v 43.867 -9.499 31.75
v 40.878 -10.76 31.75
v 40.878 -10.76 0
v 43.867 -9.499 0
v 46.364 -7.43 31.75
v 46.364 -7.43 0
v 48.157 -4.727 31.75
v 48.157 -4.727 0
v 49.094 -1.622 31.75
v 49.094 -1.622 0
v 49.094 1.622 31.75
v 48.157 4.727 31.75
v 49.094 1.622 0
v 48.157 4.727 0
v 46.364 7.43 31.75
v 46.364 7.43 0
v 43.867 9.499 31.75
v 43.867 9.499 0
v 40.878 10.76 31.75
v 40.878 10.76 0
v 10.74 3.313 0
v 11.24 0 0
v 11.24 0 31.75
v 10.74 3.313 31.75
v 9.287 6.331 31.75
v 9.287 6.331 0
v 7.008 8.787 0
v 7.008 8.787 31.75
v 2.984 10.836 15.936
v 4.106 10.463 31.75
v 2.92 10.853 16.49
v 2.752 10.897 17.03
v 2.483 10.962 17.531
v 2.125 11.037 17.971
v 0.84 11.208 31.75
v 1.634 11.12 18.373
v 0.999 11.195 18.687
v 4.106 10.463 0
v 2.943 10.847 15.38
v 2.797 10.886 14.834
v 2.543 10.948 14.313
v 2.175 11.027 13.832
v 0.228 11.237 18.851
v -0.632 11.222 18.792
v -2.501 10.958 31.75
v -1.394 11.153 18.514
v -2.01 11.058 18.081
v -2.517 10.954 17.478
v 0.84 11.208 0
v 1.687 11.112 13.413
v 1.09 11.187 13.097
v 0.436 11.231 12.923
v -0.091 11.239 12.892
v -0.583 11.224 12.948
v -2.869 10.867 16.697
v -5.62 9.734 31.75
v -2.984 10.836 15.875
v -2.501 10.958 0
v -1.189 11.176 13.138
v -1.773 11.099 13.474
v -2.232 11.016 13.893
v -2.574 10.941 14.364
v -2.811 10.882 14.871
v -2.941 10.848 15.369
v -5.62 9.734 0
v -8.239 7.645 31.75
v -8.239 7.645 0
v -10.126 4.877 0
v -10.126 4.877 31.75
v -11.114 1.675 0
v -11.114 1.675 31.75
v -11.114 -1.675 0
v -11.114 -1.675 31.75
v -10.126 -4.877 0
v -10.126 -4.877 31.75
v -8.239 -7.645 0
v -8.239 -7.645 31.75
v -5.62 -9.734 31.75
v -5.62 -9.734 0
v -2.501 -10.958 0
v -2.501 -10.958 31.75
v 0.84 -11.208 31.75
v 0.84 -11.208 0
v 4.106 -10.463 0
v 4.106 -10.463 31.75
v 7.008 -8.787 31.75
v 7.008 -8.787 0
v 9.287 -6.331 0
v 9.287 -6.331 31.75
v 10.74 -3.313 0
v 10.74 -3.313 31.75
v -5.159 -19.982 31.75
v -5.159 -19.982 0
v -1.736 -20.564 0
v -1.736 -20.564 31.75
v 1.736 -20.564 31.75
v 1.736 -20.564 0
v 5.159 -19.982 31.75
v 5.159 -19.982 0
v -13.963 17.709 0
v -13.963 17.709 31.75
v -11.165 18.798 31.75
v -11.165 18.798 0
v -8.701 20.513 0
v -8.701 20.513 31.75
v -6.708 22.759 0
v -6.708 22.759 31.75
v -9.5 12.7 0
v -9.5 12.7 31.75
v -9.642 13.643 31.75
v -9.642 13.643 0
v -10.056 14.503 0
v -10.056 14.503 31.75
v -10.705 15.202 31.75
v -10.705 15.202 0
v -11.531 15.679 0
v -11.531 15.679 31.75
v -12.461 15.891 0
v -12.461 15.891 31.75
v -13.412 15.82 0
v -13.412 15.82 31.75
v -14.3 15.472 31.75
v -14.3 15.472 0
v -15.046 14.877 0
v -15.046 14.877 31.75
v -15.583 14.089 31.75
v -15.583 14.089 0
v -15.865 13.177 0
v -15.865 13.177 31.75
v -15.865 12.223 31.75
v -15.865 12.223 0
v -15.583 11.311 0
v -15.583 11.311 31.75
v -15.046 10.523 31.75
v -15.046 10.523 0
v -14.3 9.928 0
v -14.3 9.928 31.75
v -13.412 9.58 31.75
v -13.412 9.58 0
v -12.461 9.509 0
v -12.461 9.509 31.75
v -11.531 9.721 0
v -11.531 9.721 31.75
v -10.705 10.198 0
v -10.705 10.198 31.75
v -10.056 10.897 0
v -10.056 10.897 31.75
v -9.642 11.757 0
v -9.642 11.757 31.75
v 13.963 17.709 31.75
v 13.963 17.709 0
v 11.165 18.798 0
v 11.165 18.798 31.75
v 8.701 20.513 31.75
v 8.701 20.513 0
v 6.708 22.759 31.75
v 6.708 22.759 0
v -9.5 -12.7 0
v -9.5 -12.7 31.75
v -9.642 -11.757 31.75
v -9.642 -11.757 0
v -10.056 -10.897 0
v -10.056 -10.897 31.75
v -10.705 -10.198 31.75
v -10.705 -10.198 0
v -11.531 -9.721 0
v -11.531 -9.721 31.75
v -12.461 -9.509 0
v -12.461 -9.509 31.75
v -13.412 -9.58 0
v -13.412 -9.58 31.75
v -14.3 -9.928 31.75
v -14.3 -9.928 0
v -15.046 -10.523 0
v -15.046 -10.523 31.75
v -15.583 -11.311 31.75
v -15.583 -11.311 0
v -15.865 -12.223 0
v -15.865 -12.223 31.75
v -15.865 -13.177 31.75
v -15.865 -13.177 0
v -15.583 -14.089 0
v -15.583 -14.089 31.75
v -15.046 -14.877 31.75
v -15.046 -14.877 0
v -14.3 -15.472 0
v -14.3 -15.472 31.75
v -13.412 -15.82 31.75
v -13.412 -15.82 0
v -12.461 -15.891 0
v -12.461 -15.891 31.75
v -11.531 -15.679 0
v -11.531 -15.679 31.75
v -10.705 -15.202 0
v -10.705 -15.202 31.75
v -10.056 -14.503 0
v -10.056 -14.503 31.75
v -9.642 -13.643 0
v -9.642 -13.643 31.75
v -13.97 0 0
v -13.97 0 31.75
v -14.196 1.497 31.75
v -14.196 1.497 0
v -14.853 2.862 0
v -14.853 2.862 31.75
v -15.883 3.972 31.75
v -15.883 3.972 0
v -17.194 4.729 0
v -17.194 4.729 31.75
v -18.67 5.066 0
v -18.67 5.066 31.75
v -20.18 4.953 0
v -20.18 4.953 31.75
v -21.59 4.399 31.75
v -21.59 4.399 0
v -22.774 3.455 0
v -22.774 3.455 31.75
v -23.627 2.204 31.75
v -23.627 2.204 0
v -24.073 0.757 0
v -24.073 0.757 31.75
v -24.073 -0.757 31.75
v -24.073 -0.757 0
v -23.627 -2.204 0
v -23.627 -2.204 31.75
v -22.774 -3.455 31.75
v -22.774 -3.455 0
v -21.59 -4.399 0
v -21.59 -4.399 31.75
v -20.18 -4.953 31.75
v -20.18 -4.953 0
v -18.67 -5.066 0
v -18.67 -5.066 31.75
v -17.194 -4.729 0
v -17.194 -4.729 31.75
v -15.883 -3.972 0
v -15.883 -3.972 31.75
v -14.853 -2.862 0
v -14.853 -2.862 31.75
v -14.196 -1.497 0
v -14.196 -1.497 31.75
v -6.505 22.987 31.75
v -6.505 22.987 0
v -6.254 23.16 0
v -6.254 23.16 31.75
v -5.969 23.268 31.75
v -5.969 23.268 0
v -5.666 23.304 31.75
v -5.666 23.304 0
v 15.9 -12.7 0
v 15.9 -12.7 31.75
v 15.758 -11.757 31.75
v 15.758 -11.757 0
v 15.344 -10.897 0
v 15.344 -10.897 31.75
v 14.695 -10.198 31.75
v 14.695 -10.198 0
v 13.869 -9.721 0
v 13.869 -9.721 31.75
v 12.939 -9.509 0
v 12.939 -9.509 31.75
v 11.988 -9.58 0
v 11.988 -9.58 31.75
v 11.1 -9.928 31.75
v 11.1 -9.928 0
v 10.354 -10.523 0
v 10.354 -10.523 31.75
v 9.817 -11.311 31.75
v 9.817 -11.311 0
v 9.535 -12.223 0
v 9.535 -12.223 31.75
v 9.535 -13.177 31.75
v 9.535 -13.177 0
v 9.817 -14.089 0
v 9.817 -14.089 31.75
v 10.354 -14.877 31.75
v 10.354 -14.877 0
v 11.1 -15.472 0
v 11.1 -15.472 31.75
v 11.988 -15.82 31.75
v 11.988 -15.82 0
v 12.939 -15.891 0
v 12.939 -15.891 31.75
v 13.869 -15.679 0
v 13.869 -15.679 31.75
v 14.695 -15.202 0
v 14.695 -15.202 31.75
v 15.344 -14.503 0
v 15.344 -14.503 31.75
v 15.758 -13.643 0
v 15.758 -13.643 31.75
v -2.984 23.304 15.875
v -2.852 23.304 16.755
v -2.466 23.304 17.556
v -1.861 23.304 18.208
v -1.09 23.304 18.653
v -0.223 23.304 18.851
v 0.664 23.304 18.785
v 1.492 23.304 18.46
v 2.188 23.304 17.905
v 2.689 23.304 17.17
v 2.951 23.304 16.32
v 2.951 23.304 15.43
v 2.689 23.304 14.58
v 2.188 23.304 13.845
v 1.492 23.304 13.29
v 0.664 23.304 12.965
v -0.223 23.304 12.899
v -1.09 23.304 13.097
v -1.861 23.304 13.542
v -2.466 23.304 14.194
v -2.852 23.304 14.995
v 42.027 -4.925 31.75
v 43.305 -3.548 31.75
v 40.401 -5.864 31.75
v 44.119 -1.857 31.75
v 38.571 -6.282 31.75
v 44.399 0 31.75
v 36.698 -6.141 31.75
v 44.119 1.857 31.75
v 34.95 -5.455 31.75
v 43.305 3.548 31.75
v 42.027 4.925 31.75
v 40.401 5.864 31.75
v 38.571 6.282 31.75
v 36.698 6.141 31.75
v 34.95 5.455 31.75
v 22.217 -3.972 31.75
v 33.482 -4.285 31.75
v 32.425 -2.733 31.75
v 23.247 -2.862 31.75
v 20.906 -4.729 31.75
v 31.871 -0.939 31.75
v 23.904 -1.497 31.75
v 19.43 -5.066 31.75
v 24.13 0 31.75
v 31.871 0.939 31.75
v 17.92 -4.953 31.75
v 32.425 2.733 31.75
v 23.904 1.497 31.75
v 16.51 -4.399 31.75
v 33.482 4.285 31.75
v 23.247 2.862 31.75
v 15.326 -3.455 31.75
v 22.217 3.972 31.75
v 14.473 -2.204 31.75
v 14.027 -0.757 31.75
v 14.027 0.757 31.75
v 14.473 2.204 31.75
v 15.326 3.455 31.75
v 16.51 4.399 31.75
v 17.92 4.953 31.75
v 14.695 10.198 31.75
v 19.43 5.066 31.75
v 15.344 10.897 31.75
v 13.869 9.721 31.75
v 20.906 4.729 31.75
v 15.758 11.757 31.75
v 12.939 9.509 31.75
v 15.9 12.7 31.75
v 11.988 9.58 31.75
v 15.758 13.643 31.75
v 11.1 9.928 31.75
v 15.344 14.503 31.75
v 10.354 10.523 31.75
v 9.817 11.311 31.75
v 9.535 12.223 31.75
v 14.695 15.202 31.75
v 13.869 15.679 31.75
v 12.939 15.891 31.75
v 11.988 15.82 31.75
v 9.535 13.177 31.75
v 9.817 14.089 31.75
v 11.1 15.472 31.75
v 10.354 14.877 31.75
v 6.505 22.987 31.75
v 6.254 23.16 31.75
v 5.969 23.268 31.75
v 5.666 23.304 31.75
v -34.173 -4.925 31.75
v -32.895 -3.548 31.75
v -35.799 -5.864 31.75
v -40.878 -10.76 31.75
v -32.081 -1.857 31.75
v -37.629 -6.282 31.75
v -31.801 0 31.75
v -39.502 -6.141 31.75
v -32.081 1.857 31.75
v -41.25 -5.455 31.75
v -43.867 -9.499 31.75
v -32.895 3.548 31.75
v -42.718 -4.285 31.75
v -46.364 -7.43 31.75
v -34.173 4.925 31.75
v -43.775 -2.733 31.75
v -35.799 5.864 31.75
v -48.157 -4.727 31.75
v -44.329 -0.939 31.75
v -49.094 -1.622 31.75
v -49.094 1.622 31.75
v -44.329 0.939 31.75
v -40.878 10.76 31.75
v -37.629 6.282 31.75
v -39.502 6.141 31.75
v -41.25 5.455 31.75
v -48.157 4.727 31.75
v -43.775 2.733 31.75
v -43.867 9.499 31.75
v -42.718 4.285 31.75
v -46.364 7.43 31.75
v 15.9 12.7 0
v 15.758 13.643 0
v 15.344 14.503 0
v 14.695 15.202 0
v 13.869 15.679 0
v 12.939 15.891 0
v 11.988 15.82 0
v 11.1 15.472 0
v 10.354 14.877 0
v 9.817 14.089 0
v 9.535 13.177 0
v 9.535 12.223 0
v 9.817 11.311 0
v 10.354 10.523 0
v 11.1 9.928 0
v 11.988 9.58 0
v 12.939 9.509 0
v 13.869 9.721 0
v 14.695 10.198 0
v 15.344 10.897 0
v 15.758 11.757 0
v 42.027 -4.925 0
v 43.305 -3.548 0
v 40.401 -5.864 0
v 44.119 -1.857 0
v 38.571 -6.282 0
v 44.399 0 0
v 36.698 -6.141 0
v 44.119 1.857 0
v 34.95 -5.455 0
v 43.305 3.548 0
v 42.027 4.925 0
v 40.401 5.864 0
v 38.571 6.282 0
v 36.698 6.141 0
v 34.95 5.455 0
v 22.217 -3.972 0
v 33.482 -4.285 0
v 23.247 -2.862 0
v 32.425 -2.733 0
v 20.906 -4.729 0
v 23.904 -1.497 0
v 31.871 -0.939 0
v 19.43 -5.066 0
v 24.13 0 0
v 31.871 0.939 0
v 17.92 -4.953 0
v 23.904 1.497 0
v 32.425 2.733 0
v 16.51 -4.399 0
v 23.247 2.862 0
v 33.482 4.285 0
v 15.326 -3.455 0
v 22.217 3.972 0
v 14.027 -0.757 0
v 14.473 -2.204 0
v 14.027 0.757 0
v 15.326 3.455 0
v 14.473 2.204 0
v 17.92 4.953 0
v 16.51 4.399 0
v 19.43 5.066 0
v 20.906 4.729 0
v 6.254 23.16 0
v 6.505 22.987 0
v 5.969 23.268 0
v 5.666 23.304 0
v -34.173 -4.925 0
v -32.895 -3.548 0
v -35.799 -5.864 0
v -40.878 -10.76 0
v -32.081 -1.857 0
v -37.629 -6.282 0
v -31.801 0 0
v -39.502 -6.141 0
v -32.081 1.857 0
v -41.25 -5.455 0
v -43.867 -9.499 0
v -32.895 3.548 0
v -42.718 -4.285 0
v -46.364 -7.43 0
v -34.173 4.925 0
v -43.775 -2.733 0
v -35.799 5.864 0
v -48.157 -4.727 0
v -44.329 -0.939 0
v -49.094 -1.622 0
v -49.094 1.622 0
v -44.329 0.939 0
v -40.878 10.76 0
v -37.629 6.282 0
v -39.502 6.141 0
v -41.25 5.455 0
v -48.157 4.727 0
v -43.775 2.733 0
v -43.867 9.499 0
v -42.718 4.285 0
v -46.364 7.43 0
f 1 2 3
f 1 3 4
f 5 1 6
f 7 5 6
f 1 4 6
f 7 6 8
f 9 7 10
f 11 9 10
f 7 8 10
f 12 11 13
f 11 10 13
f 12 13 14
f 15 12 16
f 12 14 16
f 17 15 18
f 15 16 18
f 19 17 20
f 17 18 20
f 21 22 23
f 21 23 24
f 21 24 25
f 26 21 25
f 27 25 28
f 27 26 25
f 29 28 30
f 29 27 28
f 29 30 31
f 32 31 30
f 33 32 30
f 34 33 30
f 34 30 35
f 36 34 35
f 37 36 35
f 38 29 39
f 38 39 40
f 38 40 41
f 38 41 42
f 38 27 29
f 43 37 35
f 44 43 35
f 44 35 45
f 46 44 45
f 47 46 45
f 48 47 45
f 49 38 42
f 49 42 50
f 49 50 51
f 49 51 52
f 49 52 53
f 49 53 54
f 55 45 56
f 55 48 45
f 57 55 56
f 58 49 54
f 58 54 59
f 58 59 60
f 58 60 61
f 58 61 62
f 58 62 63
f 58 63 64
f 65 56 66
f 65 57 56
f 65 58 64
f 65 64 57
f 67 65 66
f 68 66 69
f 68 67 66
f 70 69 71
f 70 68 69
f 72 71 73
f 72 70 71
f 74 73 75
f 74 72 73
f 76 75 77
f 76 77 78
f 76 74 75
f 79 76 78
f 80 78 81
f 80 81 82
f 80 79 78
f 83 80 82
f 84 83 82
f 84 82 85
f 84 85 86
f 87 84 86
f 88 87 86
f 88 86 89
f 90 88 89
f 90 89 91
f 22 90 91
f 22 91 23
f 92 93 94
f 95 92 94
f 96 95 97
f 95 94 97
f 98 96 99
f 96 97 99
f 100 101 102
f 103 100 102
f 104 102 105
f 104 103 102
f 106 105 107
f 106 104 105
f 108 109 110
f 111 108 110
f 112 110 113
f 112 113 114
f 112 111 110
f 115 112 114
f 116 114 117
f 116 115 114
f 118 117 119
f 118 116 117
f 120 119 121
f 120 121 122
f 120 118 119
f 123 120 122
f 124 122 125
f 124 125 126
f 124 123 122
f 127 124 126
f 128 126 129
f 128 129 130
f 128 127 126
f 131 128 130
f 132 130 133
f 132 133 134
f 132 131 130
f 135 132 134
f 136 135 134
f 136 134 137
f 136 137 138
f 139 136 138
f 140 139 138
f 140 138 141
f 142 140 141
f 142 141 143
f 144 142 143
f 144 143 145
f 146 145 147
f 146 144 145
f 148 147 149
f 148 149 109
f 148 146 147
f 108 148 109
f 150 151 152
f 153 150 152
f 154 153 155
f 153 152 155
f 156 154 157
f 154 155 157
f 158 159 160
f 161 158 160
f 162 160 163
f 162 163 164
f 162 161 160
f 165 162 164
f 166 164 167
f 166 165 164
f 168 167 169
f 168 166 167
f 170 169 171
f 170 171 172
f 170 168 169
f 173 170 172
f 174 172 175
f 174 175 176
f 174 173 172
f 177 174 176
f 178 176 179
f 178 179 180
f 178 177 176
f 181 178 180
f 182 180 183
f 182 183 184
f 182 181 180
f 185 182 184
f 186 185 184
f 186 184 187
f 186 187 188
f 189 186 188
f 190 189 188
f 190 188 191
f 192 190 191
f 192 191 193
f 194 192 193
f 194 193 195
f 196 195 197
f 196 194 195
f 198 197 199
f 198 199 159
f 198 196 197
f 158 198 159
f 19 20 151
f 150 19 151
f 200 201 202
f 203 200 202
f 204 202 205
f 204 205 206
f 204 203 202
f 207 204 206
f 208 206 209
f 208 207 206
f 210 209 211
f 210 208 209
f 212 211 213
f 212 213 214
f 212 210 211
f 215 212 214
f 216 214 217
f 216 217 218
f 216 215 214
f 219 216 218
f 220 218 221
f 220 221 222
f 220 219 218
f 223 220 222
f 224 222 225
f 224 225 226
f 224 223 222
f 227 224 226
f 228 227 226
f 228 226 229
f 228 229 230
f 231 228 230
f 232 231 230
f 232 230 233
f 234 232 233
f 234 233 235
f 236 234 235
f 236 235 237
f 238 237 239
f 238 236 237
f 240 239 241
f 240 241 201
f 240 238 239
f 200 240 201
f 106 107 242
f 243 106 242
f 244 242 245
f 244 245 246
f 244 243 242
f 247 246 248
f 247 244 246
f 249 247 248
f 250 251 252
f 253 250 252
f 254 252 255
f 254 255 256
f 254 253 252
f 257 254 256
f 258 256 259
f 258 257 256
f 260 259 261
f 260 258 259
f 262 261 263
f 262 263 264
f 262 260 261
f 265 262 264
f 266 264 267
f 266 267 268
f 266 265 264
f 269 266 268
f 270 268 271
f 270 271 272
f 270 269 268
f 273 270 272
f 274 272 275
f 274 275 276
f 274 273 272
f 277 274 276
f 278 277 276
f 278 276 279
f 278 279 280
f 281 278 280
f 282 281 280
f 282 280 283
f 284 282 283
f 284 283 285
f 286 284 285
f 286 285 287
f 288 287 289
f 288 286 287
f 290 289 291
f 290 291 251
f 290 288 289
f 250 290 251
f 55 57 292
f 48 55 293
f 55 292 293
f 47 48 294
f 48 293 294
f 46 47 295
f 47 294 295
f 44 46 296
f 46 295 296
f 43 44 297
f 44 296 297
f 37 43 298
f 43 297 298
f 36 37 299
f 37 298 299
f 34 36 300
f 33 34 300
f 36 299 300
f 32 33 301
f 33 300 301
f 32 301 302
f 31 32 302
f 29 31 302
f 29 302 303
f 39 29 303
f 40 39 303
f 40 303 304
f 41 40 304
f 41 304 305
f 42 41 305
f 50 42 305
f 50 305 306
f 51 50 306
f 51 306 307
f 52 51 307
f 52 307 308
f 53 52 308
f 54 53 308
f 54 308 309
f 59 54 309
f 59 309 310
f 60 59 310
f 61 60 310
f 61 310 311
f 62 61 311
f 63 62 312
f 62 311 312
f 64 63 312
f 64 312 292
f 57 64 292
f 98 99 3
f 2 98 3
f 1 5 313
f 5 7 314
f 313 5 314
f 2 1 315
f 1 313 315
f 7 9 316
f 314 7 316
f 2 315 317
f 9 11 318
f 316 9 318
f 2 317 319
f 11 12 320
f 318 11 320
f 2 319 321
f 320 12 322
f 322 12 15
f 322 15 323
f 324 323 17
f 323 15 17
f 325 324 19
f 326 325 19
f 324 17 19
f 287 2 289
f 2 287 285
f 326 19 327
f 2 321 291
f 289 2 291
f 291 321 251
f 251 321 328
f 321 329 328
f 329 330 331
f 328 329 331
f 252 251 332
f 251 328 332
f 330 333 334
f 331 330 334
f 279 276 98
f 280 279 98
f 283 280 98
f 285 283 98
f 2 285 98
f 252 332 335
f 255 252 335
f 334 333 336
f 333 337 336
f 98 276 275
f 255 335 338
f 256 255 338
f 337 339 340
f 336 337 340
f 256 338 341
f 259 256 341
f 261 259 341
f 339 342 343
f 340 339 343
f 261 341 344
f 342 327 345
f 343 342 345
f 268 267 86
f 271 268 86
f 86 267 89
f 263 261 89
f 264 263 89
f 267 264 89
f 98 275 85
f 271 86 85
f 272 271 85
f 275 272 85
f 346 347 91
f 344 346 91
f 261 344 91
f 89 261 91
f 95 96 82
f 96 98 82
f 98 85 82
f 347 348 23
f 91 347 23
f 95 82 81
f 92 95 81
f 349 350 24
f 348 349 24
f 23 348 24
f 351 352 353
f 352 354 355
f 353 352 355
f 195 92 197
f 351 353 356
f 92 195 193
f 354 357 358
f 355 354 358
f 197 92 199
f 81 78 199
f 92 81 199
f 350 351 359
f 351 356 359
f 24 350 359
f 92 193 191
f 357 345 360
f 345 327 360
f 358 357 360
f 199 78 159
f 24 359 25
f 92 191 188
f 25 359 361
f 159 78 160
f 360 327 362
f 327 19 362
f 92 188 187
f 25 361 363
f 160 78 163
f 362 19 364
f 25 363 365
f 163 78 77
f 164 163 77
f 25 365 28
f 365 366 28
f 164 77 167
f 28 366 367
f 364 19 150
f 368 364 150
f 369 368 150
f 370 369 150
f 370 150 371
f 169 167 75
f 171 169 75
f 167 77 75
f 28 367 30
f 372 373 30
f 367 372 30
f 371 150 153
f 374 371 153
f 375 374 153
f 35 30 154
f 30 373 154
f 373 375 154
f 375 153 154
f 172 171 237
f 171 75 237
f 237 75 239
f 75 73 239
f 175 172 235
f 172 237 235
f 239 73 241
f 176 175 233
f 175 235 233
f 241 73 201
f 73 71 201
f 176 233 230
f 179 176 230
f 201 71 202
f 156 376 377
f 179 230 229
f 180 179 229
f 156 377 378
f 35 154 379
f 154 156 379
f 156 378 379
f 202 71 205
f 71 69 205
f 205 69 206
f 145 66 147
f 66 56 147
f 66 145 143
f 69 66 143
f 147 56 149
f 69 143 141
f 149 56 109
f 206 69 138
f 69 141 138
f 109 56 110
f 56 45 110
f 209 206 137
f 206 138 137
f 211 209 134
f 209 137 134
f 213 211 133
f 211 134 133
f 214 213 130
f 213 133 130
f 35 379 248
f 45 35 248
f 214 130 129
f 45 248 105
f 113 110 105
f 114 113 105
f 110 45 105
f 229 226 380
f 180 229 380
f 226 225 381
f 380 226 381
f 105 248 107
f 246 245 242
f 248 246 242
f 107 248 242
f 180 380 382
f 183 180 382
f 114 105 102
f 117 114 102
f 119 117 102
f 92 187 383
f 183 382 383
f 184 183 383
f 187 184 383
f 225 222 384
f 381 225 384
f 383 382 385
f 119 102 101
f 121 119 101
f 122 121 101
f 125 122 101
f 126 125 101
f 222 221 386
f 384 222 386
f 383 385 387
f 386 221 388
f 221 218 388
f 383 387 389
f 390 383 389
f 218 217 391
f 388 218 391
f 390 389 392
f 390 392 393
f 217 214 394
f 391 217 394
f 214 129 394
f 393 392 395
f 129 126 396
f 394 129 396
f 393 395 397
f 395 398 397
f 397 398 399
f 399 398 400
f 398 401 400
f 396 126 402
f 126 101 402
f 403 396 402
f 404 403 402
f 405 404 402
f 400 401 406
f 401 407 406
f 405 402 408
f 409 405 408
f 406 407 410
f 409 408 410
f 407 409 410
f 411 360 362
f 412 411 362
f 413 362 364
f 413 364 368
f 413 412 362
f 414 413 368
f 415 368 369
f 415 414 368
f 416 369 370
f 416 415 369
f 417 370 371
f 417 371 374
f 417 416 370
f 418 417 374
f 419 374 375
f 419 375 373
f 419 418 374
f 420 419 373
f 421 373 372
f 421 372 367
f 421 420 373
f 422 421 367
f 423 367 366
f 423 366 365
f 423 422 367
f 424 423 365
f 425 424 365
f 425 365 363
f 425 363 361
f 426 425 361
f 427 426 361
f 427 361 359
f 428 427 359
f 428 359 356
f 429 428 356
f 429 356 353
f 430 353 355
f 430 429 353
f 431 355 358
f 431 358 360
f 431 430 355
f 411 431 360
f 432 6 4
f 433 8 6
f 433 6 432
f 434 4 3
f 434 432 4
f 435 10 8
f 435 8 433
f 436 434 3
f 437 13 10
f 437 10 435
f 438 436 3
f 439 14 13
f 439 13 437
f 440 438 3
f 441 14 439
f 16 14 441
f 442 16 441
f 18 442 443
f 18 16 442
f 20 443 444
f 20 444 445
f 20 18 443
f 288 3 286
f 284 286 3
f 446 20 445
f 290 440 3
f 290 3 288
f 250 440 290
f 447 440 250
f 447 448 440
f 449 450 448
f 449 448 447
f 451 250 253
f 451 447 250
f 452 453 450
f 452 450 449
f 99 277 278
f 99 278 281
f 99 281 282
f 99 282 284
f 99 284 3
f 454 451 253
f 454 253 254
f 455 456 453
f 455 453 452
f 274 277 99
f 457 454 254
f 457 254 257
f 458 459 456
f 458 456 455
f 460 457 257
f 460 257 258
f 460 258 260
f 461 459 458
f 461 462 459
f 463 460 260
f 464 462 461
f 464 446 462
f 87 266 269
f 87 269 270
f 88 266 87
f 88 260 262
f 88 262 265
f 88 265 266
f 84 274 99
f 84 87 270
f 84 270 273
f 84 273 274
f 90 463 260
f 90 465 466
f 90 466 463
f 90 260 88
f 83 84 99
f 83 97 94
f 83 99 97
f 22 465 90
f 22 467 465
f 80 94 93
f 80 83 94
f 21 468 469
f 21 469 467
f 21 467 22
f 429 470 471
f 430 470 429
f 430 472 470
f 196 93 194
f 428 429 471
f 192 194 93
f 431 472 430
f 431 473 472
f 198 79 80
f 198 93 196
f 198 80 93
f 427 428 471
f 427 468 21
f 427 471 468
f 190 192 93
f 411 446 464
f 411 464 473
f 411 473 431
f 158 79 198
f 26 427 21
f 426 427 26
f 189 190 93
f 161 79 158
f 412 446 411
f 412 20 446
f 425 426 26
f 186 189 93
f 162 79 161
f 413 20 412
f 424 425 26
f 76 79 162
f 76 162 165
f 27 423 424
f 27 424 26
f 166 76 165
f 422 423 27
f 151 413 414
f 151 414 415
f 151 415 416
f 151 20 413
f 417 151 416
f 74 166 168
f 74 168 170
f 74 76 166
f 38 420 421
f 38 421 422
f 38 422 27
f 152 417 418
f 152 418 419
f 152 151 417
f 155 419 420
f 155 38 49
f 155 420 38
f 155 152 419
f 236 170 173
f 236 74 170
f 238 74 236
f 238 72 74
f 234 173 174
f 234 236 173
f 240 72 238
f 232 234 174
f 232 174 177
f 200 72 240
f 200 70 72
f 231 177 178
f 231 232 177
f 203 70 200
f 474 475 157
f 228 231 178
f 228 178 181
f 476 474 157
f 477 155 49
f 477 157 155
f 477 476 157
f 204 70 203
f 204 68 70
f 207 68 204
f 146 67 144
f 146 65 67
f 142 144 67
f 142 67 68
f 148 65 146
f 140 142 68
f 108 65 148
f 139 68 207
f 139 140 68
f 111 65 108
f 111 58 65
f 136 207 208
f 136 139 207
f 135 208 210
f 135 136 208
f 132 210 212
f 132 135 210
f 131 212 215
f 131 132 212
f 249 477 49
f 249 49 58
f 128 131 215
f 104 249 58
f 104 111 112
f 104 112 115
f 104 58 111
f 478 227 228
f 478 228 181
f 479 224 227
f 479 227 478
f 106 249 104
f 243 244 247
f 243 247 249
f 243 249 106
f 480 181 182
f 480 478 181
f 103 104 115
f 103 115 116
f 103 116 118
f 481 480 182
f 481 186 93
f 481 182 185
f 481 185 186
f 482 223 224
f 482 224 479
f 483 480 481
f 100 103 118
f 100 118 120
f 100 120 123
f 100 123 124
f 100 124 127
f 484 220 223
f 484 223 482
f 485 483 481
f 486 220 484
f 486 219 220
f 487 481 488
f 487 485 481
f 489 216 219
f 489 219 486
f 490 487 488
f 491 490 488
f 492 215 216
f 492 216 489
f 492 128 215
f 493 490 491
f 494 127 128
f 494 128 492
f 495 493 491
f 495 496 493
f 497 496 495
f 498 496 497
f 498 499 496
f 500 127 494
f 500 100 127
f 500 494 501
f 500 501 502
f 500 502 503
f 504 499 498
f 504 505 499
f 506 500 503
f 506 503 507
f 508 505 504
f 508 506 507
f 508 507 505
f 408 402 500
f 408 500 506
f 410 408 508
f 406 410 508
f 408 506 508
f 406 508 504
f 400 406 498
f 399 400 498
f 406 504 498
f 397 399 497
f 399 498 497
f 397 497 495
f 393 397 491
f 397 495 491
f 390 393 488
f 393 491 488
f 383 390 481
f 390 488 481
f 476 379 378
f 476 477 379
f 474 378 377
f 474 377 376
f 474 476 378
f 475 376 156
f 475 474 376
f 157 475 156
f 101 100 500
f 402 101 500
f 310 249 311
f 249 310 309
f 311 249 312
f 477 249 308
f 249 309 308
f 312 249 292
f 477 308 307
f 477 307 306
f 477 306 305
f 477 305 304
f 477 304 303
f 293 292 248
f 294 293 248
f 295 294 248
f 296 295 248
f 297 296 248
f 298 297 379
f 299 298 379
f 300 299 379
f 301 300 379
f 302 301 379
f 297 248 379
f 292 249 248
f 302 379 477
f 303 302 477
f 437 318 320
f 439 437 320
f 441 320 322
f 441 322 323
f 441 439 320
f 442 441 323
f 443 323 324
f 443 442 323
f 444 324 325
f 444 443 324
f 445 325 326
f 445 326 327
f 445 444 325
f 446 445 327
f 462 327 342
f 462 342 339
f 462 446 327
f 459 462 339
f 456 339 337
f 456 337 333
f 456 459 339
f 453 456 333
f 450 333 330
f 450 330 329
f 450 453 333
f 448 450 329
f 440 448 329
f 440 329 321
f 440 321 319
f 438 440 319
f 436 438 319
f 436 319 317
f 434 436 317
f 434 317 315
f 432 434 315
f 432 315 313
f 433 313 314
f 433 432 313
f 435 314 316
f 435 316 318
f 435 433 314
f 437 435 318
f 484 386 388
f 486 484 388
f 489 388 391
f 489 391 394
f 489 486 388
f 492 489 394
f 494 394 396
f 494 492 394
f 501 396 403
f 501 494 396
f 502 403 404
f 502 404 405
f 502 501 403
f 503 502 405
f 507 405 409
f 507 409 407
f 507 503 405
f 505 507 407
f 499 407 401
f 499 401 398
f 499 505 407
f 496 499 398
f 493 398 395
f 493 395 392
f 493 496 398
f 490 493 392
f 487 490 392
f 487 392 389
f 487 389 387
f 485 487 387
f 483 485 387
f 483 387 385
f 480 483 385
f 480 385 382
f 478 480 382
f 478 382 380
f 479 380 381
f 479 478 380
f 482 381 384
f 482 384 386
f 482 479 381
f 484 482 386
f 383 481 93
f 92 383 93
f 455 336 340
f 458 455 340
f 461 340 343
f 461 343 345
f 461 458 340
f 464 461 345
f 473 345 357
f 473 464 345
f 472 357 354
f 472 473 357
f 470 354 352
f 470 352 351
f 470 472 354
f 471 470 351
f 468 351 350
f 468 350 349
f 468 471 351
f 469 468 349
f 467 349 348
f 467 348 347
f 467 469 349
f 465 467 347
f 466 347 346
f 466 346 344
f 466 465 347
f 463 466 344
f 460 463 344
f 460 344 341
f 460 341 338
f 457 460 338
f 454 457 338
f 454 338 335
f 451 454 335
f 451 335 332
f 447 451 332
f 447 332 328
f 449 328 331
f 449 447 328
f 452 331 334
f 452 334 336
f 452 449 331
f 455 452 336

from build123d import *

# Parameters (mm, degrees)
F0_R        = 3.2004
F0_R_2      = 6.2992
F0_R_3      = 5.08
F0_R_4      = 11.2395
F1_DEPTH    = 31.75
F2_W        = 12.7
F2_H        = 5.1071889116
F3_DEPTH    = 31.75
F4_T1_DEPTH = 31.75
F5_R        = 1.27
F6_R        = 2.9845
F7_DEPTH    = 25.4


# Not quite as in the source:
# - a fillet or chamfer that OpenCascade refuses, or shapes differently, is made with other operations: its cross-section is extruded or revolved along the edge and cut away or added


with BuildPart() as f1:
    # F0 (on Top) → F1 (new body)
    with BuildSketch(Plane.XY):
        with BuildLine():
            Line((-5.159375, 19.9821734518), (-40.878125, 10.7596318587))
            ThreePointArc((-40.878125, 10.7596318587), (-49.2125, 0), (-40.878125, -10.7596318587))
            Line((-40.878125, -10.7596318587), (-5.159375, -19.9821734518))
            ThreePointArc((-5.159375, -19.9821734518), (0, -20.6375), (5.159375, -19.9821734518))
            Line((5.159375, -19.9821734518), (40.878125, -10.7596318587))
            ThreePointArc((40.878125, -10.7596318587), (49.2125, 0), (40.878125, 10.7596318587))
            Line((40.878125, 10.7596318587), (5.159375, 19.9821734518))
            ThreePointArc((5.159375, 19.9821734518), (0, 20.6375), (-5.159375, 19.9821734518))
        make_face()
        with Locations((-12.7, -12.7)):
            Circle(F0_R, mode=Mode.SUBTRACT)
        with Locations((12.7, -12.7)):
            Circle(F0_R, mode=Mode.SUBTRACT)
        with Locations((-38.1, 0)):
            Circle(F0_R_2, mode=Mode.SUBTRACT)
        with Locations((-19.05, 0)):
            Circle(F0_R_3, mode=Mode.SUBTRACT)
        with Locations((-12.7, 12.7)):
            Circle(F0_R, mode=Mode.SUBTRACT)
        Circle(F0_R_4, mode=Mode.SUBTRACT)
        with Locations((19.05, 0)):
            Circle(F0_R_3, mode=Mode.SUBTRACT)
        with Locations((38.1, 0)):
            Circle(F0_R_2, mode=Mode.SUBTRACT)
        with Locations((12.7, 12.7)):
            Circle(F0_R, mode=Mode.SUBTRACT)
    extrude(amount=F1_DEPTH)

    # F2 (on face) → F3 (join)
    with BuildSketch(Plane.XY.offset(31.75)):
        with Locations((0, 20.7509055442)):
            Rectangle(F2_W, F2_H)
    extrude(amount=-F3_DEPTH)

    # F4: fillet of radius 12.7 on 2 edges, made by hand

    # F4_s2 → F4_t1 (join)
    with BuildSketch(Plane.XY):
        with BuildLine():
            ThreePointArc((-13.9630832797, 17.7090657484), (-9.6168370541, 19.7724670423), (-6.35, 23.3045))
            Line((-6.35, 23.3045), (-6.35, 19.6747553987))
            Line((-6.35, 19.6747553987), (-13.9630832797, 17.7090657484))
        make_face()
        with BuildLine():
            ThreePointArc((13.9630832797, 17.7090657484), (9.6168370541, 19.7724670423), (6.35, 23.3045))
            Line((6.35, 23.3045), (6.35, 19.6747553987))
            Line((6.35, 19.6747553987), (13.9630832797, 17.7090657484))
        make_face()
    extrude(amount=F4_T1_DEPTH)

    # F5
    f5_edges = [f1.edges().sort_by_distance(p)[0] for p in [
        (-6.35, 23.3045, 15.875),
        (6.35, 23.3045, 15.875),
    ]]
    fillet(f5_edges, radius=F5_R)

    # F6 (on face) → F7 (cut)
    with BuildSketch(Plane(origin=(0, 23.3045, 0), x_dir=(-1, 0, 0), z_dir=(0, 1, 0))):
        with Locations((0, 15.875)):
            Circle(F6_R)
    extrude(amount=-F7_DEPTH, mode=Mode.SUBTRACT)


solid = f1.part
